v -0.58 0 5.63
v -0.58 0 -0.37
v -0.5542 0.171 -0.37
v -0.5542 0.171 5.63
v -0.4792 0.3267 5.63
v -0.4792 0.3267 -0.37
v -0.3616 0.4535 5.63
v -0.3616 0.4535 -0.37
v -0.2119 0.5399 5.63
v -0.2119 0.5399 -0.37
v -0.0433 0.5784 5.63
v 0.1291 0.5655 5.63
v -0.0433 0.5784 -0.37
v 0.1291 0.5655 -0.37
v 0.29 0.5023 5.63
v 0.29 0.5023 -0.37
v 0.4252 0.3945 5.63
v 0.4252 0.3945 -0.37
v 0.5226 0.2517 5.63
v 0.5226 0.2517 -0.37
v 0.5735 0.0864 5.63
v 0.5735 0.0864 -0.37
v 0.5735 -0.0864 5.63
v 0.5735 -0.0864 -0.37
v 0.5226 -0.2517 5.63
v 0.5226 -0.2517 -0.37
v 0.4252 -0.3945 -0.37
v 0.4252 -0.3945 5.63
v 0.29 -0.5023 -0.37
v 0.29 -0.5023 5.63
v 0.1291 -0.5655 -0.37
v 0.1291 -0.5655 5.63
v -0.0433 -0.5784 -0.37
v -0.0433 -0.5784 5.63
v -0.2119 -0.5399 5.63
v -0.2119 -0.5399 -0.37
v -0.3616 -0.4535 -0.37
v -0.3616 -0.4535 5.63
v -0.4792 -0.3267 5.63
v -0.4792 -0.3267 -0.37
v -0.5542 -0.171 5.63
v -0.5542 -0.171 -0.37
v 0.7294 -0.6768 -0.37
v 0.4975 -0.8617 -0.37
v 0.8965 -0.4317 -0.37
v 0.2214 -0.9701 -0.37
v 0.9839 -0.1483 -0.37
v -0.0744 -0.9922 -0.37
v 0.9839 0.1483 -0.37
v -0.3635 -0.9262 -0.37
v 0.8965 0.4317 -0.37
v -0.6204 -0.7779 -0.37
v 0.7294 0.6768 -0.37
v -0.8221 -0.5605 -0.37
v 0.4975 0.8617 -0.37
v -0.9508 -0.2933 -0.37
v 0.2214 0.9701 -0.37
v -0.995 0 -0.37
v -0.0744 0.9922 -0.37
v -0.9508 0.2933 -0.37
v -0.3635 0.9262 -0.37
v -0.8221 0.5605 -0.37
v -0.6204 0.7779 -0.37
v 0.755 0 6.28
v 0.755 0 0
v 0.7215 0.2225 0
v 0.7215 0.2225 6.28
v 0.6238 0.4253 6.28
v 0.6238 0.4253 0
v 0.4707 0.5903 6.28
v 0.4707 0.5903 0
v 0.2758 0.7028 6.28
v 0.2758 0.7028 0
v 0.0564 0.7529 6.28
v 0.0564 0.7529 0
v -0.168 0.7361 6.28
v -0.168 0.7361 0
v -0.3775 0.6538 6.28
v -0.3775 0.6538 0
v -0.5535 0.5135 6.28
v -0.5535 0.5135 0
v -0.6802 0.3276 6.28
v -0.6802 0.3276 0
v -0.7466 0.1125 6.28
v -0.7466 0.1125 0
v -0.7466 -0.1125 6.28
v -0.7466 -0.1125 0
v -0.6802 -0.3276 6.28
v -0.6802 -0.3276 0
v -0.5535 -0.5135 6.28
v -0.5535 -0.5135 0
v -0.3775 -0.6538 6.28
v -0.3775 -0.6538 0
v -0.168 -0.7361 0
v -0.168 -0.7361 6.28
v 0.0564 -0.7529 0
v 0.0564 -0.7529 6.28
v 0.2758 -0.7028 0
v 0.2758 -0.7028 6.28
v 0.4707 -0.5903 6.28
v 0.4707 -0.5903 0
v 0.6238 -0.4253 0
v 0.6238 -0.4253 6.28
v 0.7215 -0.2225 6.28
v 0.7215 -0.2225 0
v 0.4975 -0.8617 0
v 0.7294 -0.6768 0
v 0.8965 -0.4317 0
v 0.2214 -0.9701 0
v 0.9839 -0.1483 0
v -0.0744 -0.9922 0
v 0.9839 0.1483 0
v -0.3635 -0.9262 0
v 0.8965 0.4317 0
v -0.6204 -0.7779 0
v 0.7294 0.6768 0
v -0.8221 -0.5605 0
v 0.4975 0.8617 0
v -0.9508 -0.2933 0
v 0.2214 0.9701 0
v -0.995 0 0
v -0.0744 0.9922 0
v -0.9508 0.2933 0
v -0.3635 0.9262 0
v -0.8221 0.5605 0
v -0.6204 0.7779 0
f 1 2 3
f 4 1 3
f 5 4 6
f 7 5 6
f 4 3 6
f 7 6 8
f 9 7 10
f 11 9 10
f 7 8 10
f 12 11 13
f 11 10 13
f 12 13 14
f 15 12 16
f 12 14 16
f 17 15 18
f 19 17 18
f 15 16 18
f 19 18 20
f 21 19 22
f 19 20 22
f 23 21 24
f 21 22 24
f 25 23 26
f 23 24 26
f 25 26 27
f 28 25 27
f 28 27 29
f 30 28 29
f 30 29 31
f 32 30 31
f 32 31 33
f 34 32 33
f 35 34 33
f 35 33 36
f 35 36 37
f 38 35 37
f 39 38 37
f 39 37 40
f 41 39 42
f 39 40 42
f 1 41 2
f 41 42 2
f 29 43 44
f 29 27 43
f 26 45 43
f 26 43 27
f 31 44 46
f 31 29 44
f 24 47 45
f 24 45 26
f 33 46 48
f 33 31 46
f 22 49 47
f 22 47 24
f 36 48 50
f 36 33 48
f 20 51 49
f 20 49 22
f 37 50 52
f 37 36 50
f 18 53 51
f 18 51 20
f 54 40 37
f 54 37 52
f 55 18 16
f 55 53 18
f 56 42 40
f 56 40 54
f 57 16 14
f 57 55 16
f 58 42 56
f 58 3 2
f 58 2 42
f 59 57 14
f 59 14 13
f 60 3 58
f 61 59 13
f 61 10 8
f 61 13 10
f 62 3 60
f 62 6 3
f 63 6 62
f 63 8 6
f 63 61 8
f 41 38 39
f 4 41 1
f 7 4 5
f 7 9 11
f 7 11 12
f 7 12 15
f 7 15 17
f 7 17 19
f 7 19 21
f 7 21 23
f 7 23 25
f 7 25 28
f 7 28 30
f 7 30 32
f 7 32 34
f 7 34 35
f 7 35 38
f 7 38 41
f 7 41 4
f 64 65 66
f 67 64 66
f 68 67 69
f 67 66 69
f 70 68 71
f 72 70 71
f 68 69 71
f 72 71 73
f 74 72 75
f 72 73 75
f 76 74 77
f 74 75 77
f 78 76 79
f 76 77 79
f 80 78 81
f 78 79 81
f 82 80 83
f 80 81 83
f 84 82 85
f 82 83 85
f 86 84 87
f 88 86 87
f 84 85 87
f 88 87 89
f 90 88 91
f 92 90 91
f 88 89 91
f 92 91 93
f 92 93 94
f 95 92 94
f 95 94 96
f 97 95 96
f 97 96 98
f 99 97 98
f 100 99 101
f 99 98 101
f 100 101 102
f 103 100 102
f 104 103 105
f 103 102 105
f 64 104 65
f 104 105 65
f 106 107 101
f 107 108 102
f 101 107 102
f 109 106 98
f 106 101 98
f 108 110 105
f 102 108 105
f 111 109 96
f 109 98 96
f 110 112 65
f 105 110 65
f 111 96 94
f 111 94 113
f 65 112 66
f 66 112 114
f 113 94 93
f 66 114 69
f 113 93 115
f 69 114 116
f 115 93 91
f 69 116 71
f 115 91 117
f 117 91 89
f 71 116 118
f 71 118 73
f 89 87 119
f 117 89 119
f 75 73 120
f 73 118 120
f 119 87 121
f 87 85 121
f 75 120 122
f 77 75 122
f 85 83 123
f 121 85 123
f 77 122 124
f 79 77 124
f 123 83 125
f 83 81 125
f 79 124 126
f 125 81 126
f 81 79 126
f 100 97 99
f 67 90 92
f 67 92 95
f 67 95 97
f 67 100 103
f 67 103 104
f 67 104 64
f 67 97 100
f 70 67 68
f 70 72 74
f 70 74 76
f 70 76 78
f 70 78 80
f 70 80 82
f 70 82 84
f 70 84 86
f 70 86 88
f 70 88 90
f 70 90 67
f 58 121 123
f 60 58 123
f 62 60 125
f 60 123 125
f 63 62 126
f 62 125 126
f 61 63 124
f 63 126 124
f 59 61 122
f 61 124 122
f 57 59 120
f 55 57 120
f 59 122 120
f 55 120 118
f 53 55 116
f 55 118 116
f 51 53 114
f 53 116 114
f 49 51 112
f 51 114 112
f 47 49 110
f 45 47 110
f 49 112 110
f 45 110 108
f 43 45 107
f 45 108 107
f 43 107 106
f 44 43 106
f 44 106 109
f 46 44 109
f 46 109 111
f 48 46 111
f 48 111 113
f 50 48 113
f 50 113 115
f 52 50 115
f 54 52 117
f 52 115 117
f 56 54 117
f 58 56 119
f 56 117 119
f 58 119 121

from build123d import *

# Parameters (mm, degrees)
SKETCH1_R           = 0.755
BOSS_EXTRUDE1_DEPTH = 6.28
SKETCH2_R           = 0.995
BOSS_EXTRUDE2_DEPTH = 0.37
SKETCH3_R           = 0.58
CUT_EXTRUDE1_DEPTH  = 6


with BuildPart() as part:
    # Sketch1 → Boss-Extrude1 (new body)
    with BuildSketch(Plane.XY):
        Circle(SKETCH1_R)
    extrude(amount=BOSS_EXTRUDE1_DEPTH)

    # Sketch2 → Boss-Extrude2 (add)
    with BuildSketch(Plane(origin=(0, 0, 0), x_dir=(-1, 0, 0), z_dir=(0, 0, -1))):
        Circle(SKETCH2_R)
    extrude(amount=BOSS_EXTRUDE2_DEPTH)

    # Sketch3 → Cut-Extrude1 (cut)
    with BuildSketch(Plane(origin=(0, 0, -0.37), x_dir=(-1, 0, 0), z_dir=(0, 0, -1))):
        Circle(SKETCH3_R)
    extrude(amount=-CUT_EXTRUDE1_DEPTH, mode=Mode.SUBTRACT)


solid = part.part
